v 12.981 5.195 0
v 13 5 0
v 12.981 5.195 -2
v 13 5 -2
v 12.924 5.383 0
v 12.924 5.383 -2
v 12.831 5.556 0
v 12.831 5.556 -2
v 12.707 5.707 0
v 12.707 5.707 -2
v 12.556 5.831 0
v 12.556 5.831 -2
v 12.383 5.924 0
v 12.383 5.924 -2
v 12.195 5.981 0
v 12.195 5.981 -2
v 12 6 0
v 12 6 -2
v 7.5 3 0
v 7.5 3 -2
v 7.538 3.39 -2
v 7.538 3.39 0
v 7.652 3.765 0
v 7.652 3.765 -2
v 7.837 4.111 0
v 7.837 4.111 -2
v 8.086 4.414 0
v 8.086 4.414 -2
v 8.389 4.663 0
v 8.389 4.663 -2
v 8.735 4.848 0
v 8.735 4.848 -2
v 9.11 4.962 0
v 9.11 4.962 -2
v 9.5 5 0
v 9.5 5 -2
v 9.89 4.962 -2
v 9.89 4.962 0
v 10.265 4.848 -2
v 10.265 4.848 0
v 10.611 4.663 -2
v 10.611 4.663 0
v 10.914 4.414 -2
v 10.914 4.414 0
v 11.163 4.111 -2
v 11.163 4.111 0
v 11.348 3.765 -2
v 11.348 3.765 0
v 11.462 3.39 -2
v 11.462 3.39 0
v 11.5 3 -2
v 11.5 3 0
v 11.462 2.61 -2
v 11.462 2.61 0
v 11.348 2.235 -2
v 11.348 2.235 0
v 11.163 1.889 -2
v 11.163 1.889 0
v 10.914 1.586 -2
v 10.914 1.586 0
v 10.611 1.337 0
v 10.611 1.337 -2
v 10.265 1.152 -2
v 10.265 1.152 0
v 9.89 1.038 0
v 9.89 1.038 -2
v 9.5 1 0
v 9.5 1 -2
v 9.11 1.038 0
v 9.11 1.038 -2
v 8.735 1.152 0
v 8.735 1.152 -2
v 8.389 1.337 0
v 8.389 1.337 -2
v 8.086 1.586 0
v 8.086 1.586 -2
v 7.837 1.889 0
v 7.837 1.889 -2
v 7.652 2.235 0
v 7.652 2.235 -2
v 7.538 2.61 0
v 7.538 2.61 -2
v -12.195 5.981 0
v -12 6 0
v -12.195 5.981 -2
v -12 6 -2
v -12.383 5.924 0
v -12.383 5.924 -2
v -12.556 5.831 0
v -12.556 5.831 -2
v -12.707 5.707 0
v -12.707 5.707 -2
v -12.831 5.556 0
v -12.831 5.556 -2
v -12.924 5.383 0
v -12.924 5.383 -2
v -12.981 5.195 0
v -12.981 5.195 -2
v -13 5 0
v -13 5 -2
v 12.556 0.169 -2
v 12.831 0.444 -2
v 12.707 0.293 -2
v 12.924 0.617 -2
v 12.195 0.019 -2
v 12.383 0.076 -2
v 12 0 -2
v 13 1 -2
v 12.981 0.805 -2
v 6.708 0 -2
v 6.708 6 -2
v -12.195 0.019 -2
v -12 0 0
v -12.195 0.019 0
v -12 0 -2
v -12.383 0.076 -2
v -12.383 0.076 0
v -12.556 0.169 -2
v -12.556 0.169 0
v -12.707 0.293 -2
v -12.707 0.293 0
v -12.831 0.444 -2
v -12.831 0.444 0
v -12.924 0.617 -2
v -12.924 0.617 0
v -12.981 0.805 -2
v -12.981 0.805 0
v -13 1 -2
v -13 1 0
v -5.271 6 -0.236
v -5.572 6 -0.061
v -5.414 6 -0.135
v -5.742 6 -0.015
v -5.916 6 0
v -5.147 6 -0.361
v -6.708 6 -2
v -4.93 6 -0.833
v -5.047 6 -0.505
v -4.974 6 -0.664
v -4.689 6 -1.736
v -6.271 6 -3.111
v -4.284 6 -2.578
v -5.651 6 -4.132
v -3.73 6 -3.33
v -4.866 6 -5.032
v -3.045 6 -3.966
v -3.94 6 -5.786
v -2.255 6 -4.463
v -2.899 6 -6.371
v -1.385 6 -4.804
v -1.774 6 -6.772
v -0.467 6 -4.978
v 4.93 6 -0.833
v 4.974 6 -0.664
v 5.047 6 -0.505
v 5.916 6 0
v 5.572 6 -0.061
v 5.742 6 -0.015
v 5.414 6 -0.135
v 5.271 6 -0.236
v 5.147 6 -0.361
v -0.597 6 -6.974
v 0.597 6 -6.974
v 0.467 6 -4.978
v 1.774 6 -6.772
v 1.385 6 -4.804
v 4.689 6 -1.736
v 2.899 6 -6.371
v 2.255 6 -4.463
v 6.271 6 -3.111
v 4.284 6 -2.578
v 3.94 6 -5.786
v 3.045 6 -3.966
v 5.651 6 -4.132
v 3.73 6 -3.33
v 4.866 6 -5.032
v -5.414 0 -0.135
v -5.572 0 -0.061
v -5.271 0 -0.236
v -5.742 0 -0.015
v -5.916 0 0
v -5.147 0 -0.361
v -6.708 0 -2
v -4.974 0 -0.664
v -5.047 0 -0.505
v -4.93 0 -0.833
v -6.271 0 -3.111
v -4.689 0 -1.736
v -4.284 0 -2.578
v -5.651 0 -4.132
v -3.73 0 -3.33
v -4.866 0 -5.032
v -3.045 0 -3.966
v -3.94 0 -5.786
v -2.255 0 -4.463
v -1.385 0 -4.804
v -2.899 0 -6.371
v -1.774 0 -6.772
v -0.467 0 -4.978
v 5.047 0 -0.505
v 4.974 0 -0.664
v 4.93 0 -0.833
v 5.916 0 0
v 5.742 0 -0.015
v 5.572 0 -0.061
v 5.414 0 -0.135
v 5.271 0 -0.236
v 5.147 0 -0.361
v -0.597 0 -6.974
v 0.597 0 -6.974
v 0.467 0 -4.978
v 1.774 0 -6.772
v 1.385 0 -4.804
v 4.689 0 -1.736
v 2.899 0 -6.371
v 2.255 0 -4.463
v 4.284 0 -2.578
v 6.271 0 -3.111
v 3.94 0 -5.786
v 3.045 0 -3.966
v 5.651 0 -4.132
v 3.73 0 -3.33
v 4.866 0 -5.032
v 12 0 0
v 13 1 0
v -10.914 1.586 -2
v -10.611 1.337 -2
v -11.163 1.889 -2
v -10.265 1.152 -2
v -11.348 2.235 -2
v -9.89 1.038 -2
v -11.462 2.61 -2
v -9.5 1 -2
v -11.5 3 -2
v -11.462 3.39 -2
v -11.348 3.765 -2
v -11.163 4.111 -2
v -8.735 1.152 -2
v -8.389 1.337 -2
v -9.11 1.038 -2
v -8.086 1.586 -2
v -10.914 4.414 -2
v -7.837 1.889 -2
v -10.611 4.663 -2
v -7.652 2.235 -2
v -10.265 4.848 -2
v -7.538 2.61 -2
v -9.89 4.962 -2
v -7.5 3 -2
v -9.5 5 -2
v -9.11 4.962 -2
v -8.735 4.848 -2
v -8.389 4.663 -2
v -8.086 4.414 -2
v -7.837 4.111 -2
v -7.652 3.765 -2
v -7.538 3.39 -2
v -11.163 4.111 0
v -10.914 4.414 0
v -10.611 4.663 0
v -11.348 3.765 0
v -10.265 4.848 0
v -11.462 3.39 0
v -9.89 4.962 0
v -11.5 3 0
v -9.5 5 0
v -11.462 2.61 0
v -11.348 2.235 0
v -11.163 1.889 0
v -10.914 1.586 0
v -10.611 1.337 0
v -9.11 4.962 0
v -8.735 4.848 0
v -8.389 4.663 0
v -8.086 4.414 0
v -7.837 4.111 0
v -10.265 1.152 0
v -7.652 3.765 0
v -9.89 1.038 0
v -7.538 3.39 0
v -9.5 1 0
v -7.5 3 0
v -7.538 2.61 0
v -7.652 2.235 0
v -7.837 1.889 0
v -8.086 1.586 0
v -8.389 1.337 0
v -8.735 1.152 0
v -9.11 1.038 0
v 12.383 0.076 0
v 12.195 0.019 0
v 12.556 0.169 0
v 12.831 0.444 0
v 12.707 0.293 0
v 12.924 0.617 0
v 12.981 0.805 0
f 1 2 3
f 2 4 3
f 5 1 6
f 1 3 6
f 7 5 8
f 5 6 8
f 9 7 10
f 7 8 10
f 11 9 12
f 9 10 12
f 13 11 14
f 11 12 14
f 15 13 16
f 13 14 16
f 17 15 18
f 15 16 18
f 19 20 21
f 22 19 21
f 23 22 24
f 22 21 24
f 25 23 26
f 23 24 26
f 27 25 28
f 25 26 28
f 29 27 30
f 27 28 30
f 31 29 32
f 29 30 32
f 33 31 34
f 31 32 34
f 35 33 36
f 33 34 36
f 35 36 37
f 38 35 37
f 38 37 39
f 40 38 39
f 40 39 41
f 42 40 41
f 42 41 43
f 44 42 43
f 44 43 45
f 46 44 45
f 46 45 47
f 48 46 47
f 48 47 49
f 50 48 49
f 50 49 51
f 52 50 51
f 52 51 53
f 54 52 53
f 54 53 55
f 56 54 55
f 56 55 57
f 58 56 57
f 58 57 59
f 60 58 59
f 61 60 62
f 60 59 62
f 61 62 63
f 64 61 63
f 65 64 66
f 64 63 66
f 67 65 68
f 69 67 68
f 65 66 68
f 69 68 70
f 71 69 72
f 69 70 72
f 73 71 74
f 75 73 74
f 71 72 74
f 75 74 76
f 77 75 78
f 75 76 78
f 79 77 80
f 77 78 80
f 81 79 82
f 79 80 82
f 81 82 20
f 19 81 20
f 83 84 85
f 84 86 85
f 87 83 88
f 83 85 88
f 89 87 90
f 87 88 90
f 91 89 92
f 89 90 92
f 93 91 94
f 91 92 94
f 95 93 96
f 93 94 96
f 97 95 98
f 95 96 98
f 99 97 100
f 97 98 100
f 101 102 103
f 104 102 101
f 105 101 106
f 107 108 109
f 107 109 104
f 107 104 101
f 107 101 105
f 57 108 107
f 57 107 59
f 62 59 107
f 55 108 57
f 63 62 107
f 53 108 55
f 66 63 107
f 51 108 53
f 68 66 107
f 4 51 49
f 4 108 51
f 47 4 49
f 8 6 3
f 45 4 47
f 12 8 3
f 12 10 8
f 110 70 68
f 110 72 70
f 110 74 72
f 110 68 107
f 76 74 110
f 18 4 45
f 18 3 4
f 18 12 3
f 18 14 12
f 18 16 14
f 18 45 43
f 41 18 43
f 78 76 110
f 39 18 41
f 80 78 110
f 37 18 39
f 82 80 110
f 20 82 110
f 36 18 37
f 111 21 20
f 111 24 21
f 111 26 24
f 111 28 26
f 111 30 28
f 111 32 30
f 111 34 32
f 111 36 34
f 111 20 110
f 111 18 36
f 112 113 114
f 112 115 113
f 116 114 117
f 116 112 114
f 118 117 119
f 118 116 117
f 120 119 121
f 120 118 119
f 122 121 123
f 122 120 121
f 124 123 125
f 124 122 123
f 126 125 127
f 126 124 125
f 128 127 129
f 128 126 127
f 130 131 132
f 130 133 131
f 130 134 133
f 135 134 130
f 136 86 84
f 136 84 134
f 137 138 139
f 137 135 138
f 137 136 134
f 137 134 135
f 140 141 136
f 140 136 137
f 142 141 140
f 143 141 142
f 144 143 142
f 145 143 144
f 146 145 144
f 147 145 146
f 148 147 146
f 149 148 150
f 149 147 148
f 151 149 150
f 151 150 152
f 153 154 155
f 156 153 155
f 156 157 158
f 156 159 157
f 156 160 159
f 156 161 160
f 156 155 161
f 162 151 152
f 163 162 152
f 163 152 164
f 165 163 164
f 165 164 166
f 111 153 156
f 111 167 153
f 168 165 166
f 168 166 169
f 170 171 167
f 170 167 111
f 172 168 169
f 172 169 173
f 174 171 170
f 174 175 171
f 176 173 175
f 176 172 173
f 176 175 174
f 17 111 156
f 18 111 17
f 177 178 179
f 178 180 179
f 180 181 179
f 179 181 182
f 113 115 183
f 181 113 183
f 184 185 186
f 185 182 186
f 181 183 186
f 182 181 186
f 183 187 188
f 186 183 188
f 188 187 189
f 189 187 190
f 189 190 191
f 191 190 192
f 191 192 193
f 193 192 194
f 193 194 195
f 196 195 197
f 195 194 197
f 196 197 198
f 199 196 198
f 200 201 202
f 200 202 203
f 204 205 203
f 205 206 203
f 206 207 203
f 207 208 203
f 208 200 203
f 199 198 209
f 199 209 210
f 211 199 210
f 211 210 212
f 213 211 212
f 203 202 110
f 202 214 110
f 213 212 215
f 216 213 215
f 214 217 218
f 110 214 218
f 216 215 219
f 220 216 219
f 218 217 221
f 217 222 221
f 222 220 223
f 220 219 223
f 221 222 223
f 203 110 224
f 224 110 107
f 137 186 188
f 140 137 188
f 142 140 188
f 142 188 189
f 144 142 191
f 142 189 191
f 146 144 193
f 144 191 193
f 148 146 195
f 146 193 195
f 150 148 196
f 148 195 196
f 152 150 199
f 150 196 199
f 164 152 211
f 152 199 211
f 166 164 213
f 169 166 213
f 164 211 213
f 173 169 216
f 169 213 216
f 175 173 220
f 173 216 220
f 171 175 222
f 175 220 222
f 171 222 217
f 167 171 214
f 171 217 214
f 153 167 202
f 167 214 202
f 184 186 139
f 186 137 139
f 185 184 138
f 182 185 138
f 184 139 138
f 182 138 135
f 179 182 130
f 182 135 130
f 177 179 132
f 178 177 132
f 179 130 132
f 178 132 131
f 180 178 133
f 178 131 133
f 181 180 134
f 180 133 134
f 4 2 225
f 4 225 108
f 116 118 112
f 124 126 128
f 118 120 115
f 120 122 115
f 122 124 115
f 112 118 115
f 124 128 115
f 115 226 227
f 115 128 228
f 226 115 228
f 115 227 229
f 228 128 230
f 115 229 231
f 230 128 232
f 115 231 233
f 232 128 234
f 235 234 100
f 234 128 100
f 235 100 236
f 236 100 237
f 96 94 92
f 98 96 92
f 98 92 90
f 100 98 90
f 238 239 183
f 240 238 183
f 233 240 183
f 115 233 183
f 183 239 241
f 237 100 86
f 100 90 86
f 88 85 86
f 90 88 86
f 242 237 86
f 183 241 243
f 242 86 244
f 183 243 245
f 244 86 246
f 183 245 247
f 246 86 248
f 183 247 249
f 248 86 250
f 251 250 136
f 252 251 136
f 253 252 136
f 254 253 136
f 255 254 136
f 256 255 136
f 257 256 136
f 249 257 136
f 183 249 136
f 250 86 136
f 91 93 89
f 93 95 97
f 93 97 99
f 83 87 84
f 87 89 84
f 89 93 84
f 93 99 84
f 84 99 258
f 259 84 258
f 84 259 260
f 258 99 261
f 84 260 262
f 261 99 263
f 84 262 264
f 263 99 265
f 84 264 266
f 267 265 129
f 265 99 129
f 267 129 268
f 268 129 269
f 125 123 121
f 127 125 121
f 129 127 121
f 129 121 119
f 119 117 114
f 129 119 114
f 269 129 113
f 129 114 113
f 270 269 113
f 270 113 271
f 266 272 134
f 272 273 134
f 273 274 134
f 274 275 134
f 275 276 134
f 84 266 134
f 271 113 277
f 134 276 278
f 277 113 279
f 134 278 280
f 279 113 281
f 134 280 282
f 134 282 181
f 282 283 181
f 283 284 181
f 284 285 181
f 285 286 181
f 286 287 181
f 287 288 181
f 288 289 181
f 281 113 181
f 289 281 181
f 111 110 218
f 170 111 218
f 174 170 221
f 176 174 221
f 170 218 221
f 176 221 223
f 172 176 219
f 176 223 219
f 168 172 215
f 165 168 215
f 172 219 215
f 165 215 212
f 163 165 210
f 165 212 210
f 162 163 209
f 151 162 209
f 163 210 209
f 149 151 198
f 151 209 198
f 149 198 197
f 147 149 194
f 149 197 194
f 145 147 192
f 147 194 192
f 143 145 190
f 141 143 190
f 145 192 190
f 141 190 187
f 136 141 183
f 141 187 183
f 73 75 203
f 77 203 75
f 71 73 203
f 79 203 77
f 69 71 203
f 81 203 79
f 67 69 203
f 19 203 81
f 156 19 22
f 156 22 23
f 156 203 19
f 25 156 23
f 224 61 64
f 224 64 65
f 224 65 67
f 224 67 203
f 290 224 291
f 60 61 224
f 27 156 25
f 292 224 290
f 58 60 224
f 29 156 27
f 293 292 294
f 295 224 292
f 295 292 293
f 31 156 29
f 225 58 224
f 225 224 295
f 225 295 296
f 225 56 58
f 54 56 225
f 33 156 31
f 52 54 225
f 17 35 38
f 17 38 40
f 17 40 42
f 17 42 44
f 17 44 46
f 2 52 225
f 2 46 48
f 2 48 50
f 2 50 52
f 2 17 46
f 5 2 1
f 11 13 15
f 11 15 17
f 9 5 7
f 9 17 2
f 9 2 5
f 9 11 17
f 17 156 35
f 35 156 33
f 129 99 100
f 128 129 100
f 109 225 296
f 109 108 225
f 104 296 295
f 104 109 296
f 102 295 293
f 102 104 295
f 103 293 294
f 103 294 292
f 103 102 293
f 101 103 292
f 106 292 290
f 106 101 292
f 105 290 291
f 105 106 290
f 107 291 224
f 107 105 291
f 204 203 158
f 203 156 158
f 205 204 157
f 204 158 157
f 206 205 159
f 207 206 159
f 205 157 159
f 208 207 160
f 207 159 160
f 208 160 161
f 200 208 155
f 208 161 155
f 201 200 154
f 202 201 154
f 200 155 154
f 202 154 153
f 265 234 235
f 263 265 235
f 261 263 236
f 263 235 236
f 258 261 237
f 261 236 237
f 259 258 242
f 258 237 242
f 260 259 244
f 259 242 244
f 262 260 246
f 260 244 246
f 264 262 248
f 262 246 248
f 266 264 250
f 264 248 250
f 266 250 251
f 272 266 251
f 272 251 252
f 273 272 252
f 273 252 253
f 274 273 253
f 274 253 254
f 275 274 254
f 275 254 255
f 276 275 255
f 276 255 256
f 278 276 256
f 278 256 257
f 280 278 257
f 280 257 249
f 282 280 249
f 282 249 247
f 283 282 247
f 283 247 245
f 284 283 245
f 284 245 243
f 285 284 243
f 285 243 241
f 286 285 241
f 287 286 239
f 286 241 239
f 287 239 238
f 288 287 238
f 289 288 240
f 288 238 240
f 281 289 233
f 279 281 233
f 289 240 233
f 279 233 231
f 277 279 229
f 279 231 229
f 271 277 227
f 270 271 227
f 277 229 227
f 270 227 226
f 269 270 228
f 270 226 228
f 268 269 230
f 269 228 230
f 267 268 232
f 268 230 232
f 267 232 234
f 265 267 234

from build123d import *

# Parameters (mm, degrees)
BOSS_EXTRUDE1_DEPTH = 6
BOSS_EXTRUDE2_DEPTH = 6
SKETCH3_R           = 2
CUT_EXTRUDE1_DEPTH  = 6
FILLET1_R           = 1


with BuildPart() as part:
    # Sketch1 → Boss-Extrude1 (new body)
    with BuildSketch(Plane(origin=(0, 0, 0), x_dir=(1, 0, 0), z_dir=(0, 1, 0))):
        with BuildLine():
            Line((5, 0), (7, 0))
            ThreePointArc((7, 0), (0, 7), (-7, 0))
            Line((-7, 0), (-5, 0))
            ThreePointArc((-5, 0), (0, 5), (5, 0))
        make_face()
    extrude(amount=BOSS_EXTRUDE1_DEPTH)

    # Sketch2 → Boss-Extrude2 (add)
    with BuildSketch(Plane(origin=(0, 6, 0), x_dir=(1, 0, 0), z_dir=(0, 1, 0))):
        Polygon((7, 0), (13, 0), (13, 2), (6.708203932, 2), align=None)
        Polygon((-6.708203932, 2), (-7, 0), (-13, 0), (-13, 2), align=None)
    extrude(amount=-BOSS_EXTRUDE2_DEPTH)

    # Sketch3 → Cut-Extrude1 (cut)
    with BuildSketch(Plane(origin=(0, 0, -2), x_dir=(-1, 0, 0), z_dir=(0, 0, -1))):
        with Locations((-9.5, 3)):
            Circle(SKETCH3_R)
        with Locations((9.5, 3)):
            Circle(SKETCH3_R)
    extrude(amount=-CUT_EXTRUDE1_DEPTH, mode=Mode.SUBTRACT)

    # Fillet1
    fillet1_edges = [part.edges().sort_by_distance(p)[0] for p in [
        (13, 6, -1),
        (13, 0, -1),
        (-13, 6, -1),
        (-13, 0, -1),
        (-5, 3, 0),
        (5, 3, 0),
    ]]
    fillet(fillet1_edges, radius=FILLET1_R)


solid = part.part
